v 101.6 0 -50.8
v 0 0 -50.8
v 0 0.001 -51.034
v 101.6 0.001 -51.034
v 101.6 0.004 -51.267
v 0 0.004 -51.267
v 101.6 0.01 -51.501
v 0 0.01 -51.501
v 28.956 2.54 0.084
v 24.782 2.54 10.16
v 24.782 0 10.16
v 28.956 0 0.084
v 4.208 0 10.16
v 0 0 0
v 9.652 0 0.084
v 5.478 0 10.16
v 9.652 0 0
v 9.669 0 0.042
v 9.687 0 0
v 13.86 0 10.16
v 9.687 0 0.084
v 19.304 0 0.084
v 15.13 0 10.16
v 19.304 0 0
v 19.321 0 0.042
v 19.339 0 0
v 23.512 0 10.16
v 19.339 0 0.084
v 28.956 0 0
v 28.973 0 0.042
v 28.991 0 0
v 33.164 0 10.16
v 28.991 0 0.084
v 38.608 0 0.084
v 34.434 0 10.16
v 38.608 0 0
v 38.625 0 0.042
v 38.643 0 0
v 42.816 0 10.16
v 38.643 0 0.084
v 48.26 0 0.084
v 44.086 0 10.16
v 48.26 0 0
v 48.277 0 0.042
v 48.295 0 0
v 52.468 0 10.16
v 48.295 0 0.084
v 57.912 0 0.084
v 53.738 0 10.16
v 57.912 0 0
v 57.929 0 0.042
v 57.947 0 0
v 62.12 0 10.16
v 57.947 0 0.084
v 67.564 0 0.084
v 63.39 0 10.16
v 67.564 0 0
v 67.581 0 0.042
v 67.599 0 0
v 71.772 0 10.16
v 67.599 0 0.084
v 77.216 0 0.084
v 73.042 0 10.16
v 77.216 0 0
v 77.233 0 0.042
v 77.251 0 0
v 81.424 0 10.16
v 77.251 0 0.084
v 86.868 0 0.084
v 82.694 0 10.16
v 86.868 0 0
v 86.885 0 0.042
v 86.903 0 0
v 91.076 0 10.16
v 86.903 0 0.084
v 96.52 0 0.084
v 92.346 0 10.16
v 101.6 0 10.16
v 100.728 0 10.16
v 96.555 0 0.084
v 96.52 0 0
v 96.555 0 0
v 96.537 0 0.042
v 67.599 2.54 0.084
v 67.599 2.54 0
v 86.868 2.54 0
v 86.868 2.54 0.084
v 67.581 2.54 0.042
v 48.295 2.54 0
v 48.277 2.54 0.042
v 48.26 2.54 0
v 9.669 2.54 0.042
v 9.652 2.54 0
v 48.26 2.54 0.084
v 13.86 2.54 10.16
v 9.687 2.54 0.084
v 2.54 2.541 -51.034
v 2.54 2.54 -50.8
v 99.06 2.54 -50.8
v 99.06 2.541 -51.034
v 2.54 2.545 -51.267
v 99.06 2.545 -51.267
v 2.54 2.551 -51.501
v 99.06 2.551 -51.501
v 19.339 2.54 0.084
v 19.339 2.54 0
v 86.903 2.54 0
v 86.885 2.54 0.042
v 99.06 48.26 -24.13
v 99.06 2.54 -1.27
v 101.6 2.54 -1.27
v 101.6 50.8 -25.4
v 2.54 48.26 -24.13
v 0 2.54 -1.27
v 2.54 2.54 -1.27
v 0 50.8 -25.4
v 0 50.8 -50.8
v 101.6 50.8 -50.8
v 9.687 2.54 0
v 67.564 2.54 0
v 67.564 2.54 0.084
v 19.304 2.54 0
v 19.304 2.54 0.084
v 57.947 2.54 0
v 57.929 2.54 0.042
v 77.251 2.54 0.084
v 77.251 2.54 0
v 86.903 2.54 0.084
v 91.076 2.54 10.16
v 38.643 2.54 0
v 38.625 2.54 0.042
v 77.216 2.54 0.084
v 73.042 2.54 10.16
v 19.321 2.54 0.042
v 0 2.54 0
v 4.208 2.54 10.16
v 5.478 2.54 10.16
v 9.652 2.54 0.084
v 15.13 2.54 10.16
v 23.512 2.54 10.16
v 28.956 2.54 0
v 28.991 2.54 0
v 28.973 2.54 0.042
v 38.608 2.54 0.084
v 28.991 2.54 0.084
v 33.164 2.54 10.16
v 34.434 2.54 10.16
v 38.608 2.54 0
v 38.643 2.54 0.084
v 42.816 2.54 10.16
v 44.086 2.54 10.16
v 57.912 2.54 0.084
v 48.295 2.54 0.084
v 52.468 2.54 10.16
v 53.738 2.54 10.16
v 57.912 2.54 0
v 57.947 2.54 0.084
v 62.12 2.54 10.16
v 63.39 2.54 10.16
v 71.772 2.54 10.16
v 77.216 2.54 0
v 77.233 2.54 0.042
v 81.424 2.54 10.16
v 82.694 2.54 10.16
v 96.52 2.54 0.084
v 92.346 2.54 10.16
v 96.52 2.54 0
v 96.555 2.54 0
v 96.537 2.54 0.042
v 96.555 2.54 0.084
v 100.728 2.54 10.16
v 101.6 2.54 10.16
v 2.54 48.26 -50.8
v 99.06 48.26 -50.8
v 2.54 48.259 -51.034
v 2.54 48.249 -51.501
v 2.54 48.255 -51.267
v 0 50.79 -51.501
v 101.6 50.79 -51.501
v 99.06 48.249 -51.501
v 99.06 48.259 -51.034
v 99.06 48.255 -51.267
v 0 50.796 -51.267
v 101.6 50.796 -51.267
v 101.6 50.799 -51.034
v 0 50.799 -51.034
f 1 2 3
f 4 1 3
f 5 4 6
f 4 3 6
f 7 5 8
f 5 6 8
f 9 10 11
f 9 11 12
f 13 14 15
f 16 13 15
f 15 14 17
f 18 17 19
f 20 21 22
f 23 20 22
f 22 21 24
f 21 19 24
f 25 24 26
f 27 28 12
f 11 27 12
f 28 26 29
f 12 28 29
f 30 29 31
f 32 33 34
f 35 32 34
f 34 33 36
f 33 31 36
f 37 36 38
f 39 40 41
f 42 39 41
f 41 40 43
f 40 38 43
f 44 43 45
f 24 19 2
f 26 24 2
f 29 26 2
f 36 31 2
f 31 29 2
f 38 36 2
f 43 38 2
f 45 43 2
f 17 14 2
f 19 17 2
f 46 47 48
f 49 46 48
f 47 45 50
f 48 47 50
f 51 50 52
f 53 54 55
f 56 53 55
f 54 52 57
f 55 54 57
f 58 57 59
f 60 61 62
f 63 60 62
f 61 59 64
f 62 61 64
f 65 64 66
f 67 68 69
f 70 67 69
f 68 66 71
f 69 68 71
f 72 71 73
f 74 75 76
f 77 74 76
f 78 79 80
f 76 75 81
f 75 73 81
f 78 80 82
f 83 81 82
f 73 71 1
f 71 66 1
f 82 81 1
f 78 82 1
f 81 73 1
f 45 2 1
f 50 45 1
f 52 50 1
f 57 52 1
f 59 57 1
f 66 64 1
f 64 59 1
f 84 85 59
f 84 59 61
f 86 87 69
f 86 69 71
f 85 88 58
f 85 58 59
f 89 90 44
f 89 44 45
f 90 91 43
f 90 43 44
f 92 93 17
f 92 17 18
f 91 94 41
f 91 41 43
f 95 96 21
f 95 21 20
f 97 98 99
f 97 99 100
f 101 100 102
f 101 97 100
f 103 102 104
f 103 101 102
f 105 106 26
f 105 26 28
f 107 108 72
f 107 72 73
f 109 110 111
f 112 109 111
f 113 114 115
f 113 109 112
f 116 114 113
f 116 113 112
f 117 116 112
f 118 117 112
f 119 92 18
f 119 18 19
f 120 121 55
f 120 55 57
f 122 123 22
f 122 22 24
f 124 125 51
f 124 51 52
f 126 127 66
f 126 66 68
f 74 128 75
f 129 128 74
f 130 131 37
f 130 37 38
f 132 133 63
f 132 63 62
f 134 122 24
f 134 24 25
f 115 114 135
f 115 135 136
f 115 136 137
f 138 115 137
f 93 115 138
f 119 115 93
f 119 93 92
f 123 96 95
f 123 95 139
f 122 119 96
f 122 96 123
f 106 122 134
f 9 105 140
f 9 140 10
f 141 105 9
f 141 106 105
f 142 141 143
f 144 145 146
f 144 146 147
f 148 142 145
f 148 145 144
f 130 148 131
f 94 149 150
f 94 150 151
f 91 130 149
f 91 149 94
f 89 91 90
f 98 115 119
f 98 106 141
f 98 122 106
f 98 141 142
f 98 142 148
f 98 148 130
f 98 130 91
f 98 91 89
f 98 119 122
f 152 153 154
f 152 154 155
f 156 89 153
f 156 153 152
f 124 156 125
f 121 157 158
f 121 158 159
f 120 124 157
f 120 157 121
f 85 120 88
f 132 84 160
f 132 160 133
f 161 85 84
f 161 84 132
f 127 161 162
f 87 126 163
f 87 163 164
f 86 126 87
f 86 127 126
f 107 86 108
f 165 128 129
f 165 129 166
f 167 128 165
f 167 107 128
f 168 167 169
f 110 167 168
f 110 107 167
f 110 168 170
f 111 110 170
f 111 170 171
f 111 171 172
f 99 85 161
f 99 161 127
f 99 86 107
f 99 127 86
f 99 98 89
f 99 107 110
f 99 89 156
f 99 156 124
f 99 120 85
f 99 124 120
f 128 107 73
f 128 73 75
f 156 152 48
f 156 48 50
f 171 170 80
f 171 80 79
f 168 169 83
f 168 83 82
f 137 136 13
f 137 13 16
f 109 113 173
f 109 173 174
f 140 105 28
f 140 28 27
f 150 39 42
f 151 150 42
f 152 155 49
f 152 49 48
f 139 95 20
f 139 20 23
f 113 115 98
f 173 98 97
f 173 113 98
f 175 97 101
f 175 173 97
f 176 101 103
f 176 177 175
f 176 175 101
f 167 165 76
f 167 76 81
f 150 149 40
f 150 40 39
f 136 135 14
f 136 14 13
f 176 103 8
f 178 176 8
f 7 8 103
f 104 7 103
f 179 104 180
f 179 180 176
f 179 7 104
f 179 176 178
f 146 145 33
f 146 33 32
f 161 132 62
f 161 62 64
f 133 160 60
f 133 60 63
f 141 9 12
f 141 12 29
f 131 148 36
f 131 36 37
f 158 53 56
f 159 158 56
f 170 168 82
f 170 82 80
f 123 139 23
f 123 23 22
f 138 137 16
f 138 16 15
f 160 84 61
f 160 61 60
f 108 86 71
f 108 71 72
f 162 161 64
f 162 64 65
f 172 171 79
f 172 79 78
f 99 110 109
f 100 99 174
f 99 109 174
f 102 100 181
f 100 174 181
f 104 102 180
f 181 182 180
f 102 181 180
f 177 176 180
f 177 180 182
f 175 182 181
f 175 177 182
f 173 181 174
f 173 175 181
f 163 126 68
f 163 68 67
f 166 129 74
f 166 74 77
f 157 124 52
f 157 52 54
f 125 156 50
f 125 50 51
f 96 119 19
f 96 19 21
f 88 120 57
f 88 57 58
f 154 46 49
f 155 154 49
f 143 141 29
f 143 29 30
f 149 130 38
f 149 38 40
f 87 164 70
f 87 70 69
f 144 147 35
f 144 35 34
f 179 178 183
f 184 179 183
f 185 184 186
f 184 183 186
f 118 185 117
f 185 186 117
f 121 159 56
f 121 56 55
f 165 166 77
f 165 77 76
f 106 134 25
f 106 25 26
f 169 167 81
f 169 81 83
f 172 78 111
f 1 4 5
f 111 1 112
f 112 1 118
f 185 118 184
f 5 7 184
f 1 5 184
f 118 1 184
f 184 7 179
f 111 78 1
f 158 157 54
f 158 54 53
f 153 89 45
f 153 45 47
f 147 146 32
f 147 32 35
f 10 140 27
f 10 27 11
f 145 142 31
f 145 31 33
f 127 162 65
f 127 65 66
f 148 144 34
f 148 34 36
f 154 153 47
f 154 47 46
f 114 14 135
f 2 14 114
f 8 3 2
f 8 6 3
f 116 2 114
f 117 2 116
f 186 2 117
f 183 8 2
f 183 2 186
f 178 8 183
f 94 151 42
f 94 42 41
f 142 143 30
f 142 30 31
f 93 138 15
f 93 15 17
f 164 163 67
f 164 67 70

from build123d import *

# Parameters (mm, degrees)
SKETCH1_W               = 101.6
SKETCH1_H               = 50.8
BOSS_EXTRUDE1_DEPTH     = 50.8
BOSS_EXTRUDE2_DEPTH     = 101.6
CUT_EXTRUDE1_DEPTH      = 101.6
SHELL1_T                = -2.54
SKETCH4_W               = 101.6
SKETCH4_H               = 2.54
BOSS_EXTRUDE3_DEPTH     = 12.7
CUT_EXTRUDE2_DEPTH      = 2.54
LPATTERN1_COUNT         = 11
LPATTERN1_PITCH         = 9.652
CUT_EXTRUDE3_DEPTH      = 109.22
CUT_EXTRUDE3_DEPTH_BACK = 5.08
SKETCH6_W               = 39.172348931
SKETCH6_H               = 64.321849683


with BuildPart() as part:
    # Sketch1 → Boss-Extrude1 (new body)
    with BuildSketch(Plane.XY):
        with Locations((50.8, 25.4)):
            Rectangle(SKETCH1_W, SKETCH1_H)
    extrude(amount=-BOSS_EXTRUDE1_DEPTH)

    # Sketch2 → Boss-Extrude2 (add)
    with BuildSketch(Plane.ZY):
        with BuildLine():
            Line((-50.8, 50.8), (-50.8, 0))
            ThreePointArc((-50.8, 0), (-76.2, 25.4), (-50.8, 50.8))
        make_face()
    extrude(amount=-BOSS_EXTRUDE2_DEPTH)

    # Sketch3 → Cut-Extrude1 (cut)
    with BuildSketch(Plane.ZY):
        Polygon((0, 0), (-25.4, 50.8), (0, 50.8), align=None)
    extrude(amount=-CUT_EXTRUDE1_DEPTH, mode=Mode.SUBTRACT)

    # Shell1
    shell1_openings = [part.faces().sort_by_distance(p)[0] for p in [
        (50.8, 25.4, -12.7),
    ]]
    offset(amount=SHELL1_T, openings=shell1_openings, kind=Kind.INTERSECTION)

    # Sketch4 → Boss-Extrude3 (add)
    with BuildSketch(Plane.XY.offset(-2.54)):
        with Locations((50.8, 1.27)):
            Rectangle(SKETCH4_W, SKETCH4_H)
    extrude(amount=BOSS_EXTRUDE3_DEPTH)

    # Sketch5 → Cut-Extrude2 (cut)
    with BuildSketch(Plane(origin=(0, 2.54, 0), x_dir=(1, 0, 0), z_dir=(0, 1, 0))):
        Polygon((0, 0), (4.208409794, -10.16), (0, -10.16), align=None)
        Polygon((5.478409794, -10.16), (9.686819587, 0), (9.686819587, -10.16), align=None)
    cut_extrude2 = extrude(amount=-CUT_EXTRUDE2_DEPTH, mode=Mode.SUBTRACT)

    # LPattern1: Cut-Extrude2 ×11
    with Locations(*[(i * LPATTERN1_PITCH, 0, 0) for i in range(1, LPATTERN1_COUNT)]):
        add(cut_extrude2, mode=Mode.SUBTRACT)

    # Sketch6 → Cut-Extrude3 (cut, two sides: drawn at the far end of the back side and taken through both)
    with BuildSketch(Plane.ZY.offset(-99.06).offset(-CUT_EXTRUDE3_DEPTH_BACK)):
        with Locations((-71.087050569, 22.645845649)):
            Rectangle(SKETCH6_W, SKETCH6_H)
    extrude(amount=CUT_EXTRUDE3_DEPTH + CUT_EXTRUDE3_DEPTH_BACK, mode=Mode.SUBTRACT)


solid = part.part
